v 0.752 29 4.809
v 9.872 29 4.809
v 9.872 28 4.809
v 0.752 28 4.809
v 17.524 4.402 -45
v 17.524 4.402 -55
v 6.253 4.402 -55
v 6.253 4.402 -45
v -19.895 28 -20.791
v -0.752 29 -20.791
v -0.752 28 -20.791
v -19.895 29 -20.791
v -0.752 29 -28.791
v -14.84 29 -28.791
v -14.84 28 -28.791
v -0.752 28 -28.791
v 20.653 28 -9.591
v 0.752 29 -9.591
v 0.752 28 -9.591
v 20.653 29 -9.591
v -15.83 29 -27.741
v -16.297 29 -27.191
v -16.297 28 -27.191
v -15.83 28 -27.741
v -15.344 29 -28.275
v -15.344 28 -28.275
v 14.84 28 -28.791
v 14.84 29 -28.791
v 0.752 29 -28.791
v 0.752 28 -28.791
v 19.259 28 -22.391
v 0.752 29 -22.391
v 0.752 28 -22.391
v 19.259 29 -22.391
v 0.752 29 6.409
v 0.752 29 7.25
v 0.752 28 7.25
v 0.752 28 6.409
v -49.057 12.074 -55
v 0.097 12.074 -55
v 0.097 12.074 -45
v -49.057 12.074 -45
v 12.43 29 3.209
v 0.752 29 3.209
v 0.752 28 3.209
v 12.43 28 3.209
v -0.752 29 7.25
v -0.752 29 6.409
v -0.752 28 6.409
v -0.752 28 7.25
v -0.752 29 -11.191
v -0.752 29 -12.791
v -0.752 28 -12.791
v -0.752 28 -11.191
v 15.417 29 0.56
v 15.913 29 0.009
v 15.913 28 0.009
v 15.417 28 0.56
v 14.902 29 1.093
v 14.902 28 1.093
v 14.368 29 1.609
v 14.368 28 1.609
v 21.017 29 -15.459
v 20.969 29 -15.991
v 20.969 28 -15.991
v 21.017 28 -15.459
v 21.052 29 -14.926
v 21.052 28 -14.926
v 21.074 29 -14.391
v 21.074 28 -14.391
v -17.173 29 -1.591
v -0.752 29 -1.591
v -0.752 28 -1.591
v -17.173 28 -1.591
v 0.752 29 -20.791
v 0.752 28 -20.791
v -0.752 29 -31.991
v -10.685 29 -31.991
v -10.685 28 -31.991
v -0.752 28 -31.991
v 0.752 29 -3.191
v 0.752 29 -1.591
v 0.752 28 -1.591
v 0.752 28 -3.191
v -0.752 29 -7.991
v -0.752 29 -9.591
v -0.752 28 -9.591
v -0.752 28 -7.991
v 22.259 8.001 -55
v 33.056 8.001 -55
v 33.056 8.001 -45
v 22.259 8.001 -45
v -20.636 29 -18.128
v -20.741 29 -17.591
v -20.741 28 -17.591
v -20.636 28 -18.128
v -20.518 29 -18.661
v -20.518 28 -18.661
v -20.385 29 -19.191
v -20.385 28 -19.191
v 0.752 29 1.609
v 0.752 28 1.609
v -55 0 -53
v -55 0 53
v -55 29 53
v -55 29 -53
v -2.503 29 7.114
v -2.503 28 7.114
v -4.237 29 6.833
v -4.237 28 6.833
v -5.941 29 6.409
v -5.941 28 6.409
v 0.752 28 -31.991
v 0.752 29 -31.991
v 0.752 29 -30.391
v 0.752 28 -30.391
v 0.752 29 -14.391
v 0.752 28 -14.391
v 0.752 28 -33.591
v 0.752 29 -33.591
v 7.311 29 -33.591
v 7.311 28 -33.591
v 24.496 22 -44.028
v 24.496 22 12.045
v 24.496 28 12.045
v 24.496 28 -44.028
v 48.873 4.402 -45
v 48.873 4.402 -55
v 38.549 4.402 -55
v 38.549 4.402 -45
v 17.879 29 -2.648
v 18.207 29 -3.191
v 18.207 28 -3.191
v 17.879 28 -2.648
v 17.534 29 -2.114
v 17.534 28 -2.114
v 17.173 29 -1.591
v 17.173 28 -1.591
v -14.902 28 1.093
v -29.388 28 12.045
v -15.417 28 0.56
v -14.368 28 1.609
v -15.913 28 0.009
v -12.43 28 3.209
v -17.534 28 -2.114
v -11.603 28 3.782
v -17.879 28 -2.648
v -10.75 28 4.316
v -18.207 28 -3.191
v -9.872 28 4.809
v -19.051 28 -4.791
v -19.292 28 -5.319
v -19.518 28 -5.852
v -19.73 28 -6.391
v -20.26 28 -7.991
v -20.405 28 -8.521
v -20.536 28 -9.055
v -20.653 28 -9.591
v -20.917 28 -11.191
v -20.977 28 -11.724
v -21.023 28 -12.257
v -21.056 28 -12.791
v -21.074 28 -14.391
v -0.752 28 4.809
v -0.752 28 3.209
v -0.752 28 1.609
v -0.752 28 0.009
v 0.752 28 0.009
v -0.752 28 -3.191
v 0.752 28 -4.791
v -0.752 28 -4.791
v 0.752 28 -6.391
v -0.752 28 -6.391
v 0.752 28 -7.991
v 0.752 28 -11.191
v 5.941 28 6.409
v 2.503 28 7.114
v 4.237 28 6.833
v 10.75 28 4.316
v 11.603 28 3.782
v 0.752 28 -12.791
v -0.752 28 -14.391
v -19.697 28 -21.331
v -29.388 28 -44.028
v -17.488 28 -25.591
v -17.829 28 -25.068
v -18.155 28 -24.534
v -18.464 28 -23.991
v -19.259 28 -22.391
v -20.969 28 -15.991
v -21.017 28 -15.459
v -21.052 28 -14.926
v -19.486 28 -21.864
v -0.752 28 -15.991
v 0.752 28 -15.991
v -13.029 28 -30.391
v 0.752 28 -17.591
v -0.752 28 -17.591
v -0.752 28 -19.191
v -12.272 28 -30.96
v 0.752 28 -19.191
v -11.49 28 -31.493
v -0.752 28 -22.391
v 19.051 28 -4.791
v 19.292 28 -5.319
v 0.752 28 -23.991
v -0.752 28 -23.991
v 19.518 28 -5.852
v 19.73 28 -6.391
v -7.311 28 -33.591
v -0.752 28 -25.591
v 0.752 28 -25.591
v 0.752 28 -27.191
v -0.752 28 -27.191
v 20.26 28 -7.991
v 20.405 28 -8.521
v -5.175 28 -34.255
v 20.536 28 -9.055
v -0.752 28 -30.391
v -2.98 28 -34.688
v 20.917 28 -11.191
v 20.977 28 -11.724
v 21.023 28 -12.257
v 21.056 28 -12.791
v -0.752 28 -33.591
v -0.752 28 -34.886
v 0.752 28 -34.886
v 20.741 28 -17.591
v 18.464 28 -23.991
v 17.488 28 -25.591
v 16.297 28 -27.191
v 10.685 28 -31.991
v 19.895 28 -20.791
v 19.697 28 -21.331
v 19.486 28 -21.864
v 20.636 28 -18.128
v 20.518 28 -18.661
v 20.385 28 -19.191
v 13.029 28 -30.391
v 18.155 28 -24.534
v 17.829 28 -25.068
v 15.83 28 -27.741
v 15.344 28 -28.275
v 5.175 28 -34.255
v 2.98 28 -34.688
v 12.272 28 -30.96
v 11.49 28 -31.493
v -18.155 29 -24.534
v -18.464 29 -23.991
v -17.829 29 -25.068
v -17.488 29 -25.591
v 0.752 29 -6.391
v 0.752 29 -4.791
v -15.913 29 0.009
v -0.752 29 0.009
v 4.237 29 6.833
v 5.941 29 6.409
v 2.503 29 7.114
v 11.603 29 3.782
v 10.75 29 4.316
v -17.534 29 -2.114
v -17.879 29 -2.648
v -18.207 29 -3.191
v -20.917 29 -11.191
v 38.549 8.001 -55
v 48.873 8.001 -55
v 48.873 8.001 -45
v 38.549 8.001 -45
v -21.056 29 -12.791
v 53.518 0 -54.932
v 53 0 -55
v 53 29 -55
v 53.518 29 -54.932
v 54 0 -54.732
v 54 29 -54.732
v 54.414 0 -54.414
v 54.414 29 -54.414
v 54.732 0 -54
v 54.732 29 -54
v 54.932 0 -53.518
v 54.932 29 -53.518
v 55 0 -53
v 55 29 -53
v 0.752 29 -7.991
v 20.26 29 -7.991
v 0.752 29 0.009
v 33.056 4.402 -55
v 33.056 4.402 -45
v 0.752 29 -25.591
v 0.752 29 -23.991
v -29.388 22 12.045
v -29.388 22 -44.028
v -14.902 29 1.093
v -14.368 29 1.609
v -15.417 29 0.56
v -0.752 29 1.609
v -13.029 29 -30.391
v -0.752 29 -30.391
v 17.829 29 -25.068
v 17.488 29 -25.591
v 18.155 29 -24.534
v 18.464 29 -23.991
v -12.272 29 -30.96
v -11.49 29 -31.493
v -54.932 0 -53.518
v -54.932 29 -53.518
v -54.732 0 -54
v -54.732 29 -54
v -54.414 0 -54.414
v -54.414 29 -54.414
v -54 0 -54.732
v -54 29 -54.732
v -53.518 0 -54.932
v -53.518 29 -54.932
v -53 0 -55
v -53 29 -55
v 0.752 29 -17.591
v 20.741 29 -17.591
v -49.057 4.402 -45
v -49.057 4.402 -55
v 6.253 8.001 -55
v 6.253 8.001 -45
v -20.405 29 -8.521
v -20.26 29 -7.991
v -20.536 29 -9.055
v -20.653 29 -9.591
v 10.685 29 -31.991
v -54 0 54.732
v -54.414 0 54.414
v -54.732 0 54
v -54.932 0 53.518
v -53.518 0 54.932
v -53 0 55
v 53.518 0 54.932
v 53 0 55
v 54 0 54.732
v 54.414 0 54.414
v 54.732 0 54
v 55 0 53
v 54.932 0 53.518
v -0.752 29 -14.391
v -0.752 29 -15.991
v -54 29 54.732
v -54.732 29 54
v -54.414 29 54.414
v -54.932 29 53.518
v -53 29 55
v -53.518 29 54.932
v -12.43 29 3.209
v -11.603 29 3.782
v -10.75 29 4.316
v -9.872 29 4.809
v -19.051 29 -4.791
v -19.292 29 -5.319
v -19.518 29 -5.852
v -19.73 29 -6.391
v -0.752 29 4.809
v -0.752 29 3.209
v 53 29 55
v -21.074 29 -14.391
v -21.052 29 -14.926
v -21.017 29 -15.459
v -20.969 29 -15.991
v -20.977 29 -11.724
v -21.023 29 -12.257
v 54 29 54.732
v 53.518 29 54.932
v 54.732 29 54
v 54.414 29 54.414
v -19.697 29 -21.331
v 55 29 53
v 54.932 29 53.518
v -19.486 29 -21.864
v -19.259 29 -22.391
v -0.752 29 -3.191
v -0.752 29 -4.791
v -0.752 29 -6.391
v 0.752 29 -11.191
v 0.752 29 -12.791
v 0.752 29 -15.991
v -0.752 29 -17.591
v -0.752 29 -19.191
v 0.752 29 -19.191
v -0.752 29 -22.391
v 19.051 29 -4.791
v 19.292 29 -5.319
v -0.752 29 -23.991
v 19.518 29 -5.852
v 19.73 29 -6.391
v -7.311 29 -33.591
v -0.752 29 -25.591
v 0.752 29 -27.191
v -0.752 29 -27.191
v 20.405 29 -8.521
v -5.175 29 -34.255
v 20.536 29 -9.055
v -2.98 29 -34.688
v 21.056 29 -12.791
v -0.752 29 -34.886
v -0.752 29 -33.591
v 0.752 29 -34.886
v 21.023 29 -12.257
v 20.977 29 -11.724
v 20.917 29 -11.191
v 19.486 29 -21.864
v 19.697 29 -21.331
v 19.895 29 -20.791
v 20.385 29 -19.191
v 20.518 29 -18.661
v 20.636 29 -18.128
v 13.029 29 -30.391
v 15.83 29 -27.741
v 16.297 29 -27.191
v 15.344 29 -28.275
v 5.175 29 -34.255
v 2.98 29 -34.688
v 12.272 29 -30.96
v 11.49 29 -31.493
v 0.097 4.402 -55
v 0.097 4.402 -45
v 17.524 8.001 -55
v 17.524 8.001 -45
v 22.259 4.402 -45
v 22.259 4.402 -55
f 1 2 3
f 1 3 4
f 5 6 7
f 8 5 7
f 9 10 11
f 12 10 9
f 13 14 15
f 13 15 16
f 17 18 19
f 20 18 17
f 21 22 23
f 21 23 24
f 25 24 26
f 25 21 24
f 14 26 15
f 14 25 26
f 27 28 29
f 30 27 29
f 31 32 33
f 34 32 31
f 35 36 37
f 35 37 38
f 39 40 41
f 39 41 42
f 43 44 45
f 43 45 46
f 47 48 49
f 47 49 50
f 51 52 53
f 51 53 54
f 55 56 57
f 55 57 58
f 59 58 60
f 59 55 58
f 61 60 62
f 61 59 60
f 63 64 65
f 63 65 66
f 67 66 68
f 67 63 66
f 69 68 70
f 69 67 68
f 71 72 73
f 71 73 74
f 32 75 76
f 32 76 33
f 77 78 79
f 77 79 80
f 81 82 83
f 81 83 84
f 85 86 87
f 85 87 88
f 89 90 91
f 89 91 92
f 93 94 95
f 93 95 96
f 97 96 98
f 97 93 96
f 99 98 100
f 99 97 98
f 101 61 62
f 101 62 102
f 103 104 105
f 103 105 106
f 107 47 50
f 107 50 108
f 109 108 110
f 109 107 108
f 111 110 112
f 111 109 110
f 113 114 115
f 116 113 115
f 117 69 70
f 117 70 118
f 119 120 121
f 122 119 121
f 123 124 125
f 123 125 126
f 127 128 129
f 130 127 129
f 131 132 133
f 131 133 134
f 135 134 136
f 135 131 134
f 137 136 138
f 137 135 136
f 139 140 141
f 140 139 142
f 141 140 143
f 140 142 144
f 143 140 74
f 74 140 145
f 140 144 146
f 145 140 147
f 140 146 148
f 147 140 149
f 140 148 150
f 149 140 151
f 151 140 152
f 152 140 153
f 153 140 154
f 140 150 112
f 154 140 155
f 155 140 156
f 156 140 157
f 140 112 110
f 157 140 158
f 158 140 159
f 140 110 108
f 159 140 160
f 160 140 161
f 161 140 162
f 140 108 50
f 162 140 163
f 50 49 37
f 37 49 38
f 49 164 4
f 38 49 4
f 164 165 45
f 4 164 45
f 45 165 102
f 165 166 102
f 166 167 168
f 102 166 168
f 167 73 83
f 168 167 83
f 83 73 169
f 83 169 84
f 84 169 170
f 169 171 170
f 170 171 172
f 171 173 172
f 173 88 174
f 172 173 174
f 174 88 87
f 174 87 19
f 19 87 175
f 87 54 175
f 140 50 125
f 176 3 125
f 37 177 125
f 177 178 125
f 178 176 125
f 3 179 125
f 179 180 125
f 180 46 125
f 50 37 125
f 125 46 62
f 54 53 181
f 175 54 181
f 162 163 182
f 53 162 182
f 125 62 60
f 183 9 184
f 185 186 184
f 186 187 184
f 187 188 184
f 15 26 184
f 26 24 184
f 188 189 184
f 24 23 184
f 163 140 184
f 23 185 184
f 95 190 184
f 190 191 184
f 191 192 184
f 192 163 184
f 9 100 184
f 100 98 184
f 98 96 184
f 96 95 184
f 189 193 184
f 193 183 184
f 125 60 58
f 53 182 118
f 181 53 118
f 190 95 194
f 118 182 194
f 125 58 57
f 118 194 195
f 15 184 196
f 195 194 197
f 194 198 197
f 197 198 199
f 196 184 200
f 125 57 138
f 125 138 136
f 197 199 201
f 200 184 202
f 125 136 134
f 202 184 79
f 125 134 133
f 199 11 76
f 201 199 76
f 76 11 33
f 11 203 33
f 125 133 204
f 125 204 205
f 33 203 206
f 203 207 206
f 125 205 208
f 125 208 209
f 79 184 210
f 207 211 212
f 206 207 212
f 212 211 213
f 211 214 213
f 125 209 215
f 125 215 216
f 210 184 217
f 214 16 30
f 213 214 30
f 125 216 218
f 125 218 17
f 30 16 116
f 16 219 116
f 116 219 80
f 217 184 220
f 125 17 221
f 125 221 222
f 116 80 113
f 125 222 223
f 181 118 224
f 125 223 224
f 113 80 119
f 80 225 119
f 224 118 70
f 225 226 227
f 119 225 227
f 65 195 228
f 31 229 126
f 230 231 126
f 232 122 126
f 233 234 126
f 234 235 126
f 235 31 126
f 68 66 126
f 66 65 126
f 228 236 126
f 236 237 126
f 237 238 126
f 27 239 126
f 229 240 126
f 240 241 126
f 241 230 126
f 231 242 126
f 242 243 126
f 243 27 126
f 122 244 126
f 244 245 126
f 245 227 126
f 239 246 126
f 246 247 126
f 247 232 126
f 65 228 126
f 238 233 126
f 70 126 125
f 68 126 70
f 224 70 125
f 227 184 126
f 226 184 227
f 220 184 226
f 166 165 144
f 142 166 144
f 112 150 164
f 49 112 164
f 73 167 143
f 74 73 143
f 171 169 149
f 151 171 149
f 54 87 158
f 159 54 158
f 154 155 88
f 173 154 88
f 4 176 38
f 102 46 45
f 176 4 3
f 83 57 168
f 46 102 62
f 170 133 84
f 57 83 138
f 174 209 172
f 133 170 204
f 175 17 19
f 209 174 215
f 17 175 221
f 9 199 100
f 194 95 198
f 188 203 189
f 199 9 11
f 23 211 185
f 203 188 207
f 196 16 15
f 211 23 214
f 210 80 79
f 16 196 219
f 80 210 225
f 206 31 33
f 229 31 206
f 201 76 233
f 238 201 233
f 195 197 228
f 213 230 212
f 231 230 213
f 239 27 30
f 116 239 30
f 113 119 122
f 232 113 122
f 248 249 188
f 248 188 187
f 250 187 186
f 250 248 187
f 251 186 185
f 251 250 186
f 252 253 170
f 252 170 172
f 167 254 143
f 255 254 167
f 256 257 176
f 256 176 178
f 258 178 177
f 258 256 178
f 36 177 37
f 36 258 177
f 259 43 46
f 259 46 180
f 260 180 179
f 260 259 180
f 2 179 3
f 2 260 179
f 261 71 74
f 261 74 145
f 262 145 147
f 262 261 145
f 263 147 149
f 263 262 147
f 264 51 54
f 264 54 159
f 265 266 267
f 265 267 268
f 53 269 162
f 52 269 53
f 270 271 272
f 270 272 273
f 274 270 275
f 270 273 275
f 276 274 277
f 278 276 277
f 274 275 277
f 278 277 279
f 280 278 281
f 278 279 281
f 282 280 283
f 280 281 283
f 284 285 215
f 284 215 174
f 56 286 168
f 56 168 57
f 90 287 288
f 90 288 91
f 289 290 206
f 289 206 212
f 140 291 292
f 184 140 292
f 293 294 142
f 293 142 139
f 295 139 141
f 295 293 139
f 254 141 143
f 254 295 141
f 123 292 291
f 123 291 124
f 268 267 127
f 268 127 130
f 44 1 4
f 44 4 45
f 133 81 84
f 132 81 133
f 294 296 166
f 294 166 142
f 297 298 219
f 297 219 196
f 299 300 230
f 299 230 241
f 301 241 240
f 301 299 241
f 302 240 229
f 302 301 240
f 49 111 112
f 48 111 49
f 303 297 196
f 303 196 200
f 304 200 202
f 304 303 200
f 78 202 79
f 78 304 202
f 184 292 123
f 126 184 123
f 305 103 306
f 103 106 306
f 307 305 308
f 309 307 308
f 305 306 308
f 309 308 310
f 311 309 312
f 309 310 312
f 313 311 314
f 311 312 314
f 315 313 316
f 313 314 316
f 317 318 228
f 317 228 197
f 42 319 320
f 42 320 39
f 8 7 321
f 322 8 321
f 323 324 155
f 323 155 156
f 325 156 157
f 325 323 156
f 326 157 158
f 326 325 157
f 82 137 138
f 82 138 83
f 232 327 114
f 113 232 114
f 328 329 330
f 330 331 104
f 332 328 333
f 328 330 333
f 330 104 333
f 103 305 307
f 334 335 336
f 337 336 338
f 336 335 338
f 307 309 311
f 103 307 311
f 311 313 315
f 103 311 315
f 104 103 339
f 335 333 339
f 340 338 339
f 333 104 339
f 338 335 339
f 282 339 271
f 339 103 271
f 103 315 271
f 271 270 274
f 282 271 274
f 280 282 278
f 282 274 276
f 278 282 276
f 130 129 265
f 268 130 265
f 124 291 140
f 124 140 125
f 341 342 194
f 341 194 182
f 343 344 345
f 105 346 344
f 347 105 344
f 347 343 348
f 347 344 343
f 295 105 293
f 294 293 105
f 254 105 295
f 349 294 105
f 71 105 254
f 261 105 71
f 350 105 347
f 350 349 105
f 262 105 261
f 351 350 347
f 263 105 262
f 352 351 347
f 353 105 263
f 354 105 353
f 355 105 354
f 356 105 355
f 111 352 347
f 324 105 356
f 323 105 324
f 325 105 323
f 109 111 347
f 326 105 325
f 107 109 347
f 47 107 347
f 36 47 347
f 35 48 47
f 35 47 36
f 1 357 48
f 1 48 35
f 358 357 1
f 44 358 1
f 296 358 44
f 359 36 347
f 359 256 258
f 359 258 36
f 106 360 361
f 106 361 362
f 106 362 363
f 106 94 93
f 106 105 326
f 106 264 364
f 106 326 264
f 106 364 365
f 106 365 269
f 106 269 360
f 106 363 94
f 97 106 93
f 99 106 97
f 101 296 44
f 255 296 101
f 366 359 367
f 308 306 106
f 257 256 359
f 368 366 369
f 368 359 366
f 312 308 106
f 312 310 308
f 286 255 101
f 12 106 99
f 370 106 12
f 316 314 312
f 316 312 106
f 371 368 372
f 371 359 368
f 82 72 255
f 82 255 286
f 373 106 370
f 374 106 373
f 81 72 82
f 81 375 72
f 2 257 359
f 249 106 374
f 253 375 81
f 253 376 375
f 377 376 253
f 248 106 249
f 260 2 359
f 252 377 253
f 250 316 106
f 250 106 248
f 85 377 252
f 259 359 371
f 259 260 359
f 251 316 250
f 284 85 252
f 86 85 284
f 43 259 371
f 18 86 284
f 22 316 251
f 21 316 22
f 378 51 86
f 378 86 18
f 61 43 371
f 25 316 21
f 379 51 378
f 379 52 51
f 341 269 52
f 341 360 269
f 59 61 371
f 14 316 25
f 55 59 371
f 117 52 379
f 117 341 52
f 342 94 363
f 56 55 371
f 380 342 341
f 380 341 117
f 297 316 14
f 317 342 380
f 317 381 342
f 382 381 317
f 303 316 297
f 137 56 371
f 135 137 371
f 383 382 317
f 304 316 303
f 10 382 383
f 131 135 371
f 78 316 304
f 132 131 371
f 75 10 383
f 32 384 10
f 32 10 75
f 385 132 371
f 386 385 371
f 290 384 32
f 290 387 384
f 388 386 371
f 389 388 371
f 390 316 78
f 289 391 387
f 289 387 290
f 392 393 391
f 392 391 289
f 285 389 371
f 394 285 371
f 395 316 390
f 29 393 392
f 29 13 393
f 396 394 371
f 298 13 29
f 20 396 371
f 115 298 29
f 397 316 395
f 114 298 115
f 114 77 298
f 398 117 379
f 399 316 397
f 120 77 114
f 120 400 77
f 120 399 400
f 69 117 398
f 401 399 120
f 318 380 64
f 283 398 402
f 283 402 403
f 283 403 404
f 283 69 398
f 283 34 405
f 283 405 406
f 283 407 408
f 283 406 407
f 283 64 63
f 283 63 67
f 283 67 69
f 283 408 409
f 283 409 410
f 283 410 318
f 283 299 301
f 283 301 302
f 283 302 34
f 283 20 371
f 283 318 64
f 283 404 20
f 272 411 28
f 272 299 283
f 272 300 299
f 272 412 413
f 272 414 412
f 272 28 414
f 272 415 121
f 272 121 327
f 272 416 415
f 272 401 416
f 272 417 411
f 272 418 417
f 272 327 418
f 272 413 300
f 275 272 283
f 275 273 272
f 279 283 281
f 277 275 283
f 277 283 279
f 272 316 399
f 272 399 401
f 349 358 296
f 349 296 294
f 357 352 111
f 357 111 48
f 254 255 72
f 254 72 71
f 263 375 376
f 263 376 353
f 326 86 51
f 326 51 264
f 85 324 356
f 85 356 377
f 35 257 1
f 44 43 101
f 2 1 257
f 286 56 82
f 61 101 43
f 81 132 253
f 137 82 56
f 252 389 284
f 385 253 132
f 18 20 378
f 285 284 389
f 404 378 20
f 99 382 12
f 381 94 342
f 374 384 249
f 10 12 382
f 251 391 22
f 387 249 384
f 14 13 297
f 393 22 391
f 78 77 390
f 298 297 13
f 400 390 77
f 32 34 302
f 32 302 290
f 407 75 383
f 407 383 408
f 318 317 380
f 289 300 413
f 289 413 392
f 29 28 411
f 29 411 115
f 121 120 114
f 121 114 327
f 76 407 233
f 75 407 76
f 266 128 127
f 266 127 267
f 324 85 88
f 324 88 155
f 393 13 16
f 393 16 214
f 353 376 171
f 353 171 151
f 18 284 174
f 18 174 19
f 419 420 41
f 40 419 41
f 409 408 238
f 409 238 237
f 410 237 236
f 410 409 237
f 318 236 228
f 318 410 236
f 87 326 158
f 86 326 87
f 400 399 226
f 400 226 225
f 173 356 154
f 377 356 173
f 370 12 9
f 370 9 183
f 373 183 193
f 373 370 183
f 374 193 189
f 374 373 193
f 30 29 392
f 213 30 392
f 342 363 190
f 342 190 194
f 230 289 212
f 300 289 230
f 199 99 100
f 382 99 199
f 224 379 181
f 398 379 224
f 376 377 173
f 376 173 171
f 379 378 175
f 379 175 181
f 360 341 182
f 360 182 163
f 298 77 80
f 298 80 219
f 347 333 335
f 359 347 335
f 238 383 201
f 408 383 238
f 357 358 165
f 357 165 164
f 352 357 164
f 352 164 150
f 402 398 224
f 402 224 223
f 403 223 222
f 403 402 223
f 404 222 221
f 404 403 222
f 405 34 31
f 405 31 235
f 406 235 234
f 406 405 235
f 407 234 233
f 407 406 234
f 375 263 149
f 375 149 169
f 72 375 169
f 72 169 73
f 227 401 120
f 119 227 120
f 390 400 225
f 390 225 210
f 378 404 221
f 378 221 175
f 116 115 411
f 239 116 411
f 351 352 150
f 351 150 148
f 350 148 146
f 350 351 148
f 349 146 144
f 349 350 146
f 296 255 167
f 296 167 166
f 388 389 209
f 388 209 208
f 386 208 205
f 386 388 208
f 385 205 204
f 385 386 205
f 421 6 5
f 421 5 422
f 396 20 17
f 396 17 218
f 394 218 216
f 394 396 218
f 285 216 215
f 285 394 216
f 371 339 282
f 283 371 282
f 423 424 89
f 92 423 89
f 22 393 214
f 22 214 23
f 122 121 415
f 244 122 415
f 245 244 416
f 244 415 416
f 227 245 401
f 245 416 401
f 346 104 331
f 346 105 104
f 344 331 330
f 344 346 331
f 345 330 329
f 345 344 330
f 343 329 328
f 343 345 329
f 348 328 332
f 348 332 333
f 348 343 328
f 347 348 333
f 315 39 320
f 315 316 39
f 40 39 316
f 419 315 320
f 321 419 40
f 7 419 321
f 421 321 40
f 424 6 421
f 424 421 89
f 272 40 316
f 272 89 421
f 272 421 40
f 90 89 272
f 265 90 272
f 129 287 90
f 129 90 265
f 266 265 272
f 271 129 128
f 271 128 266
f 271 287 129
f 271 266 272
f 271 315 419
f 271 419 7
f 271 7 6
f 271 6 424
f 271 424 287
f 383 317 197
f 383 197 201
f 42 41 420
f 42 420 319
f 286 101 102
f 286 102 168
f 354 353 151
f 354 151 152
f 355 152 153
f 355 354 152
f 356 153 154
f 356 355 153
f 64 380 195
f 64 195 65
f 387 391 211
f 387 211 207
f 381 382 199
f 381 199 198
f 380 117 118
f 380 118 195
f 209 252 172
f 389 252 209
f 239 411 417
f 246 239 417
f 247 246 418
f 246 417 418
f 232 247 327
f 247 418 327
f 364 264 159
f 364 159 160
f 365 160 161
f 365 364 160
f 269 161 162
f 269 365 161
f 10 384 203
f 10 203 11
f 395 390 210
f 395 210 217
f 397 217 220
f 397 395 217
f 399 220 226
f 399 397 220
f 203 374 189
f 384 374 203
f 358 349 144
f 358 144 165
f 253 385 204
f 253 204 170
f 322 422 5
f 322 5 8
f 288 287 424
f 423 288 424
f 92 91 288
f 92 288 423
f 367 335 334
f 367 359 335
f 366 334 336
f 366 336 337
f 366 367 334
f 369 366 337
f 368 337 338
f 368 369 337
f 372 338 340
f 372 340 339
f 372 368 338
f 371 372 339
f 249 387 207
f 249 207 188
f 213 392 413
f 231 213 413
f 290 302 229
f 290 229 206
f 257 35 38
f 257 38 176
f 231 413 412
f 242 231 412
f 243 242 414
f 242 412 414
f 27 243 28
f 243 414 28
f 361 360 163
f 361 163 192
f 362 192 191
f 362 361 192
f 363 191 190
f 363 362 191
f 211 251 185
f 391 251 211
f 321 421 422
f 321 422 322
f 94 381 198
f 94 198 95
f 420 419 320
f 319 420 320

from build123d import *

# Parameters (mm, degrees)
SKETCH_1_W          = 110
SKETCH_1_H          = 110
EXTRUDE_1_DEPTH     = 29
CUT_EXTRUDE_1_DEPTH = 7
SKETCH_3_W          = 53.883979218
SKETCH_3_H          = 56.07244117
CUT_EXTRUDE_3_DEPTH = 6
SKETCH_4_W          = 10.323301276
SKETCH_4_H          = 3.598949069
SKETCH_4_W_2        = 10.796847207
SKETCH_4_W_3        = 11.270393137
SKETCH_4_W_4        = 49.154067547
SKETCH_4_H_2        = 7.671444068
CUT_EXTRUDE_4_DEPTH = 10
FILLET_1_R          = 2


with BuildPart() as part:
    # 草图1 → 凸台-拉伸1 (new body)
    with BuildSketch(Plane(origin=(0, 0, 0), x_dir=(1, 0, 0), z_dir=(0, 1, 0))):
        Rectangle(SKETCH_1_W, SKETCH_1_H)
    extrude(amount=EXTRUDE_1_DEPTH)

    # 草图2 → 切除-拉伸1 (cut)
    with BuildSketch(Plane(origin=(0, 29, 0), x_dir=(1, 0, 0), z_dir=(0, 1, 0))):
        with BuildLine():
            Line((-0.751901528, 34.886318516), (-0.751901528, 33.59149031))
            Line((-0.751901528, 33.59149031), (-7.310776634, 33.59149031))
            ThreePointArc((-7.310776634, 33.59149031), (-4.082993976, 34.500559204), (-0.751901528, 34.886318516))
        make_face()
        with BuildLine():
            Line((-0.751901528, 31.99149031), (-0.751901528, 30.39149031))
            Line((-0.751901528, 30.39149031), (-13.029015886, 30.39149031))
            ThreePointArc((-13.029015886, 30.39149031), (-11.883781834, 31.230990299), (-10.684631719, 31.99149031))
            Line((-10.684631719, 31.99149031), (-0.751901528, 31.99149031))
        make_face()
        with BuildLine():
            Line((0.751901528, 34.886318516), (0.751901528, 33.59149031))
            Line((0.751901528, 33.59149031), (7.310776634, 33.59149031))
            ThreePointArc((7.310776634, 33.59149031), (4.082993976, 34.500559204), (0.751901528, 34.886318516))
        make_face()
        with BuildLine():
            Line((-14.840119775, 28.79149031), (-0.751901528, 28.79149031))
            Line((-0.751901528, 28.79149031), (-0.751901528, 27.19149031))
            Line((-0.751901528, 27.19149031), (-16.296719146, 27.19149031))
            ThreePointArc((-16.296719146, 27.19149031), (-15.588960341, 28.010190206), (-14.840119775, 28.79149031))
        make_face()
        with BuildLine():
            Line((-17.487622906, 25.59149031), (-0.751901528, 25.59149031))
            Line((-0.751901528, 25.59149031), (-0.751901528, 23.99149031))
            Line((-0.751901528, 23.99149031), (-18.464313009, 23.99149031))
            ThreePointArc((-18.464313009, 23.99149031), (-17.993760697, 24.802351555), (-17.487622906, 25.59149031))
        make_face()
        with BuildLine():
            Line((-19.259406919, 22.39149031), (-0.751901528, 22.39149031))
            Line((-0.751901528, 22.39149031), (-0.751901528, 20.79149031))
            Line((-0.751901528, 20.79149031), (-19.894689112, 20.79149031))
            ThreePointArc((-19.894689112, 20.79149031), (-19.593386869, 21.597977674), (-19.259406919, 22.39149031))
        make_face()
        with BuildLine():
            Line((-20.385106201, 19.19149031), (-0.751901528, 19.19149031))
            Line((-0.751901528, 19.19149031), (-0.751901528, 17.59149031))
            Line((-0.751901528, 17.59149031), (-20.740936691, 17.59149031))
            ThreePointArc((-20.740936691, 17.59149031), (-20.578577477, 18.394949879), (-20.385106201, 19.19149031))
        make_face()
        with BuildLine():
            Line((-20.969033235, 15.99149031), (-0.751901528, 15.99149031))
            Line((-0.751901528, 15.99149031), (-0.751901528, 14.39149031))
            Line((-0.751901528, 14.39149031), (-21.073543954, 14.39149031))
            ThreePointArc((-21.073543954, 14.39149031), (-21.03650575, 15.192484283), (-20.969033235, 15.99149031))
        make_face()
        with BuildLine():
            Line((-21.056309144, 12.79149031), (-0.751901528, 12.79149031))
            Line((-0.751901528, 12.79149031), (-0.751901528, 11.19149031))
            Line((-0.751901528, 11.19149031), (-20.917027866, 11.19149031))
            ThreePointArc((-20.917027866, 11.19149031), (-21.001910745, 11.990163461), (-21.056309144, 12.79149031))
        make_face()
        with BuildLine():
            Line((-20.653231097, 9.59149031), (-0.751901528, 9.59149031))
            Line((-0.751901528, 9.59149031), (-0.751901528, 7.99149031))
            Line((-0.751901528, 7.99149031), (-20.260055644, 7.99149031))
            ThreePointArc((-20.260055644, 7.99149031), (-20.472280234, 8.787647791), (-20.653231097, 9.59149031))
        make_face()
        with BuildLine():
            Line((-19.729768237, 6.39149031), (-0.751901528, 6.39149031))
            Line((-0.751901528, 6.39149031), (-0.751901528, 4.79149031))
            Line((-0.751901528, 4.79149031), (-19.050922672, 4.79149031))
            ThreePointArc((-19.050922672, 4.79149031), (-19.406841496, 5.584491395), (-19.729768237, 6.39149031))
        make_face()
        with BuildLine():
            Line((-18.206909531, 3.19149031), (-0.751901528, 3.19149031))
            Line((-0.751901528, 3.19149031), (-0.751901528, 1.59149031))
            Line((-0.751901528, 1.59149031), (-17.173393801, 1.59149031))
            ThreePointArc((-17.173393801, 1.59149031), (-17.708231587, 2.379811633), (-18.206909531, 3.19149031))
        make_face()
        with BuildLine():
            Line((-15.91349599, -0.00850969), (-0.751901528, -0.00850969))
            Line((-0.751901528, -0.00850969), (-0.751901528, -1.60850969))
            Line((-0.751901528, -1.60850969), (-14.367785306, -1.60850969))
            ThreePointArc((-14.367785306, -1.60850969), (-15.161761086, -0.828913494), (-15.91349599, -0.00850969))
        make_face()
        with BuildLine():
            Line((-12.430090691, -3.20850969), (-0.751901528, -3.20850969))
            Line((-0.751901528, -3.20850969), (-0.751901528, -4.80850969))
            Line((-0.751901528, -4.80850969), (-9.872236553, -4.80850969))
            ThreePointArc((-9.872236553, -4.80850969), (-11.17982335, -4.054326816), (-12.430090691, -3.20850969))
        make_face()
        with BuildLine():
            Line((-5.940955693, -6.40850969), (-0.751901528, -6.40850969))
            Line((-0.751901528, -6.40850969), (-0.751901528, -7.249525385))
            ThreePointArc((-0.751901528, -7.249525385), (-3.372745364, -6.991391514), (-5.940955693, -6.40850969))
        make_face()
        with BuildLine():
            Line((0.751901528, 31.99149031), (0.751901528, 30.39149031))
            Line((0.751901528, 30.39149031), (13.029015886, 30.39149031))
            ThreePointArc((13.029015886, 30.39149031), (11.883781834, 31.230990299), (10.684631719, 31.99149031))
            Line((10.684631719, 31.99149031), (0.751901528, 31.99149031))
        make_face()
        with BuildLine():
            Line((0.751901528, 28.79149031), (0.751901528, 27.19149031))
            Line((0.751901528, 27.19149031), (16.296719146, 27.19149031))
            ThreePointArc((16.296719146, 27.19149031), (15.588960341, 28.010190206), (14.840119775, 28.79149031))
            Line((14.840119775, 28.79149031), (0.751901528, 28.79149031))
        make_face()
        with BuildLine():
            Line((0.751901528, 25.59149031), (17.487622906, 25.59149031))
            ThreePointArc((17.487622906, 25.59149031), (17.993760697, 24.802351555), (18.464313009, 23.99149031))
            Line((18.464313009, 23.99149031), (0.751901528, 23.99149031))
            Line((0.751901528, 23.99149031), (0.751901528, 25.59149031))
        make_face()
        with BuildLine():
            Line((0.751901528, 22.39149031), (19.259406919, 22.39149031))
            ThreePointArc((19.259406919, 22.39149031), (19.593386869, 21.597977674), (19.894689112, 20.79149031))
            Line((19.894689112, 20.79149031), (0.751901528, 20.79149031))
            Line((0.751901528, 20.79149031), (0.751901528, 22.39149031))
        make_face()
        with BuildLine():
            Line((0.751901528, 19.19149031), (20.385106201, 19.19149031))
            ThreePointArc((20.385106201, 19.19149031), (20.578577477, 18.394949879), (20.740936691, 17.59149031))
            Line((20.740936691, 17.59149031), (0.751901528, 17.59149031))
            Line((0.751901528, 17.59149031), (0.751901528, 19.19149031))
        make_face()
        with BuildLine():
            Line((0.751901528, 15.99149031), (20.969033235, 15.99149031))
            ThreePointArc((20.969033235, 15.99149031), (21.03650575, 15.192484283), (21.073543954, 14.39149031))
            Line((21.073543954, 14.39149031), (0.751901528, 14.39149031))
            Line((0.751901528, 14.39149031), (0.751901528, 15.99149031))
        make_face()
        with BuildLine():
            Line((0.751901528, 12.79149031), (21.056309144, 12.79149031))
            ThreePointArc((21.056309144, 12.79149031), (21.001910745, 11.990163461), (20.917027866, 11.19149031))
            Line((20.917027866, 11.19149031), (0.751901528, 11.19149031))
            Line((0.751901528, 11.19149031), (0.751901528, 12.79149031))
        make_face()
        with BuildLine():
            Line((0.751901528, 9.59149031), (20.653231097, 9.59149031))
            ThreePointArc((20.653231097, 9.59149031), (20.472280234, 8.787647791), (20.260055644, 7.99149031))
            Line((20.260055644, 7.99149031), (0.751901528, 7.99149031))
            Line((0.751901528, 7.99149031), (0.751901528, 9.59149031))
        make_face()
        with BuildLine():
            Line((0.751901528, 6.39149031), (19.729768237, 6.39149031))
            ThreePointArc((19.729768237, 6.39149031), (19.406841496, 5.584491395), (19.050922672, 4.79149031))
            Line((19.050922672, 4.79149031), (0.751901528, 4.79149031))
            Line((0.751901528, 4.79149031), (0.751901528, 6.39149031))
        make_face()
        with BuildLine():
            Line((0.751901528, 3.19149031), (18.206909531, 3.19149031))
            ThreePointArc((18.206909531, 3.19149031), (17.708231587, 2.379811633), (17.173393801, 1.59149031))
            Line((17.173393801, 1.59149031), (0.751901528, 1.59149031))
            Line((0.751901528, 1.59149031), (0.751901528, 3.19149031))
        make_face()
        with BuildLine():
            Line((0.751901528, -0.00850969), (15.91349599, -0.00850969))
            ThreePointArc((15.91349599, -0.00850969), (15.161761086, -0.828913494), (14.367785306, -1.60850969))
            Line((14.367785306, -1.60850969), (0.751901528, -1.60850969))
            Line((0.751901528, -1.60850969), (0.751901528, -0.00850969))
        make_face()
        with BuildLine():
            Line((0.751901528, -3.20850969), (12.430090691, -3.20850969))
            ThreePointArc((12.430090691, -3.20850969), (11.17982335, -4.054326816), (9.872236553, -4.80850969))
            Line((9.872236553, -4.80850969), (0.751901528, -4.80850969))
            Line((0.751901528, -4.80850969), (0.751901528, -3.20850969))
        make_face()
        with BuildLine():
            Line((0.751901528, -6.40850969), (5.940955693, -6.40850969))
            ThreePointArc((5.940955693, -6.40850969), (3.372745364, -6.991391514), (0.751901528, -7.249525385))
            Line((0.751901528, -7.249525385), (0.751901528, -6.40850969))
        make_face()
    extrude(amount=-CUT_EXTRUDE_1_DEPTH, mode=Mode.SUBTRACT)

    # 草图3 → 切除-拉伸3 (cut)
    with BuildSketch(Plane(origin=(0, 22, 0), x_dir=(1, 0, 0), z_dir=(0, 1, 0))):
        with Locations((-2.446069618, 15.99149031)):
            Rectangle(SKETCH_3_W, SKETCH_3_H)
    extrude(amount=CUT_EXTRUDE_3_DEPTH, mode=Mode.SUBTRACT)

    # 草图4 → 切除-拉伸4 (cut)
    with BuildSketch(Plane(origin=(0, 0, -55), x_dir=(-1, 0, 0), z_dir=(0, 0, -1))):
        with Locations((-43.710945988, 6.201665953)):
            Rectangle(SKETCH_4_W, SKETCH_4_H)
        with Locations((-27.657738957, 6.201665953)):
            Rectangle(SKETCH_4_W_2, SKETCH_4_H)
        with Locations((-11.888659484, 6.201665953)):
            Rectangle(SKETCH_4_W_3, SKETCH_4_H)
        with Locations((24.47966795, 8.237913452)):
            Rectangle(SKETCH_4_W_4, SKETCH_4_H_2)
    extrude(amount=-CUT_EXTRUDE_4_DEPTH, mode=Mode.SUBTRACT)

    # 圆角1
    fillet_1_edges = [part.edges().sort_by_distance(p)[0] for p in [
        (-55, 14.5, -55),
        (55, 14.5, -55),
        (55, 14.5, 55),
        (-55, 14.5, 55),
    ]]
    fillet(fillet_1_edges, radius=FILLET_1_R)


solid = part.part
